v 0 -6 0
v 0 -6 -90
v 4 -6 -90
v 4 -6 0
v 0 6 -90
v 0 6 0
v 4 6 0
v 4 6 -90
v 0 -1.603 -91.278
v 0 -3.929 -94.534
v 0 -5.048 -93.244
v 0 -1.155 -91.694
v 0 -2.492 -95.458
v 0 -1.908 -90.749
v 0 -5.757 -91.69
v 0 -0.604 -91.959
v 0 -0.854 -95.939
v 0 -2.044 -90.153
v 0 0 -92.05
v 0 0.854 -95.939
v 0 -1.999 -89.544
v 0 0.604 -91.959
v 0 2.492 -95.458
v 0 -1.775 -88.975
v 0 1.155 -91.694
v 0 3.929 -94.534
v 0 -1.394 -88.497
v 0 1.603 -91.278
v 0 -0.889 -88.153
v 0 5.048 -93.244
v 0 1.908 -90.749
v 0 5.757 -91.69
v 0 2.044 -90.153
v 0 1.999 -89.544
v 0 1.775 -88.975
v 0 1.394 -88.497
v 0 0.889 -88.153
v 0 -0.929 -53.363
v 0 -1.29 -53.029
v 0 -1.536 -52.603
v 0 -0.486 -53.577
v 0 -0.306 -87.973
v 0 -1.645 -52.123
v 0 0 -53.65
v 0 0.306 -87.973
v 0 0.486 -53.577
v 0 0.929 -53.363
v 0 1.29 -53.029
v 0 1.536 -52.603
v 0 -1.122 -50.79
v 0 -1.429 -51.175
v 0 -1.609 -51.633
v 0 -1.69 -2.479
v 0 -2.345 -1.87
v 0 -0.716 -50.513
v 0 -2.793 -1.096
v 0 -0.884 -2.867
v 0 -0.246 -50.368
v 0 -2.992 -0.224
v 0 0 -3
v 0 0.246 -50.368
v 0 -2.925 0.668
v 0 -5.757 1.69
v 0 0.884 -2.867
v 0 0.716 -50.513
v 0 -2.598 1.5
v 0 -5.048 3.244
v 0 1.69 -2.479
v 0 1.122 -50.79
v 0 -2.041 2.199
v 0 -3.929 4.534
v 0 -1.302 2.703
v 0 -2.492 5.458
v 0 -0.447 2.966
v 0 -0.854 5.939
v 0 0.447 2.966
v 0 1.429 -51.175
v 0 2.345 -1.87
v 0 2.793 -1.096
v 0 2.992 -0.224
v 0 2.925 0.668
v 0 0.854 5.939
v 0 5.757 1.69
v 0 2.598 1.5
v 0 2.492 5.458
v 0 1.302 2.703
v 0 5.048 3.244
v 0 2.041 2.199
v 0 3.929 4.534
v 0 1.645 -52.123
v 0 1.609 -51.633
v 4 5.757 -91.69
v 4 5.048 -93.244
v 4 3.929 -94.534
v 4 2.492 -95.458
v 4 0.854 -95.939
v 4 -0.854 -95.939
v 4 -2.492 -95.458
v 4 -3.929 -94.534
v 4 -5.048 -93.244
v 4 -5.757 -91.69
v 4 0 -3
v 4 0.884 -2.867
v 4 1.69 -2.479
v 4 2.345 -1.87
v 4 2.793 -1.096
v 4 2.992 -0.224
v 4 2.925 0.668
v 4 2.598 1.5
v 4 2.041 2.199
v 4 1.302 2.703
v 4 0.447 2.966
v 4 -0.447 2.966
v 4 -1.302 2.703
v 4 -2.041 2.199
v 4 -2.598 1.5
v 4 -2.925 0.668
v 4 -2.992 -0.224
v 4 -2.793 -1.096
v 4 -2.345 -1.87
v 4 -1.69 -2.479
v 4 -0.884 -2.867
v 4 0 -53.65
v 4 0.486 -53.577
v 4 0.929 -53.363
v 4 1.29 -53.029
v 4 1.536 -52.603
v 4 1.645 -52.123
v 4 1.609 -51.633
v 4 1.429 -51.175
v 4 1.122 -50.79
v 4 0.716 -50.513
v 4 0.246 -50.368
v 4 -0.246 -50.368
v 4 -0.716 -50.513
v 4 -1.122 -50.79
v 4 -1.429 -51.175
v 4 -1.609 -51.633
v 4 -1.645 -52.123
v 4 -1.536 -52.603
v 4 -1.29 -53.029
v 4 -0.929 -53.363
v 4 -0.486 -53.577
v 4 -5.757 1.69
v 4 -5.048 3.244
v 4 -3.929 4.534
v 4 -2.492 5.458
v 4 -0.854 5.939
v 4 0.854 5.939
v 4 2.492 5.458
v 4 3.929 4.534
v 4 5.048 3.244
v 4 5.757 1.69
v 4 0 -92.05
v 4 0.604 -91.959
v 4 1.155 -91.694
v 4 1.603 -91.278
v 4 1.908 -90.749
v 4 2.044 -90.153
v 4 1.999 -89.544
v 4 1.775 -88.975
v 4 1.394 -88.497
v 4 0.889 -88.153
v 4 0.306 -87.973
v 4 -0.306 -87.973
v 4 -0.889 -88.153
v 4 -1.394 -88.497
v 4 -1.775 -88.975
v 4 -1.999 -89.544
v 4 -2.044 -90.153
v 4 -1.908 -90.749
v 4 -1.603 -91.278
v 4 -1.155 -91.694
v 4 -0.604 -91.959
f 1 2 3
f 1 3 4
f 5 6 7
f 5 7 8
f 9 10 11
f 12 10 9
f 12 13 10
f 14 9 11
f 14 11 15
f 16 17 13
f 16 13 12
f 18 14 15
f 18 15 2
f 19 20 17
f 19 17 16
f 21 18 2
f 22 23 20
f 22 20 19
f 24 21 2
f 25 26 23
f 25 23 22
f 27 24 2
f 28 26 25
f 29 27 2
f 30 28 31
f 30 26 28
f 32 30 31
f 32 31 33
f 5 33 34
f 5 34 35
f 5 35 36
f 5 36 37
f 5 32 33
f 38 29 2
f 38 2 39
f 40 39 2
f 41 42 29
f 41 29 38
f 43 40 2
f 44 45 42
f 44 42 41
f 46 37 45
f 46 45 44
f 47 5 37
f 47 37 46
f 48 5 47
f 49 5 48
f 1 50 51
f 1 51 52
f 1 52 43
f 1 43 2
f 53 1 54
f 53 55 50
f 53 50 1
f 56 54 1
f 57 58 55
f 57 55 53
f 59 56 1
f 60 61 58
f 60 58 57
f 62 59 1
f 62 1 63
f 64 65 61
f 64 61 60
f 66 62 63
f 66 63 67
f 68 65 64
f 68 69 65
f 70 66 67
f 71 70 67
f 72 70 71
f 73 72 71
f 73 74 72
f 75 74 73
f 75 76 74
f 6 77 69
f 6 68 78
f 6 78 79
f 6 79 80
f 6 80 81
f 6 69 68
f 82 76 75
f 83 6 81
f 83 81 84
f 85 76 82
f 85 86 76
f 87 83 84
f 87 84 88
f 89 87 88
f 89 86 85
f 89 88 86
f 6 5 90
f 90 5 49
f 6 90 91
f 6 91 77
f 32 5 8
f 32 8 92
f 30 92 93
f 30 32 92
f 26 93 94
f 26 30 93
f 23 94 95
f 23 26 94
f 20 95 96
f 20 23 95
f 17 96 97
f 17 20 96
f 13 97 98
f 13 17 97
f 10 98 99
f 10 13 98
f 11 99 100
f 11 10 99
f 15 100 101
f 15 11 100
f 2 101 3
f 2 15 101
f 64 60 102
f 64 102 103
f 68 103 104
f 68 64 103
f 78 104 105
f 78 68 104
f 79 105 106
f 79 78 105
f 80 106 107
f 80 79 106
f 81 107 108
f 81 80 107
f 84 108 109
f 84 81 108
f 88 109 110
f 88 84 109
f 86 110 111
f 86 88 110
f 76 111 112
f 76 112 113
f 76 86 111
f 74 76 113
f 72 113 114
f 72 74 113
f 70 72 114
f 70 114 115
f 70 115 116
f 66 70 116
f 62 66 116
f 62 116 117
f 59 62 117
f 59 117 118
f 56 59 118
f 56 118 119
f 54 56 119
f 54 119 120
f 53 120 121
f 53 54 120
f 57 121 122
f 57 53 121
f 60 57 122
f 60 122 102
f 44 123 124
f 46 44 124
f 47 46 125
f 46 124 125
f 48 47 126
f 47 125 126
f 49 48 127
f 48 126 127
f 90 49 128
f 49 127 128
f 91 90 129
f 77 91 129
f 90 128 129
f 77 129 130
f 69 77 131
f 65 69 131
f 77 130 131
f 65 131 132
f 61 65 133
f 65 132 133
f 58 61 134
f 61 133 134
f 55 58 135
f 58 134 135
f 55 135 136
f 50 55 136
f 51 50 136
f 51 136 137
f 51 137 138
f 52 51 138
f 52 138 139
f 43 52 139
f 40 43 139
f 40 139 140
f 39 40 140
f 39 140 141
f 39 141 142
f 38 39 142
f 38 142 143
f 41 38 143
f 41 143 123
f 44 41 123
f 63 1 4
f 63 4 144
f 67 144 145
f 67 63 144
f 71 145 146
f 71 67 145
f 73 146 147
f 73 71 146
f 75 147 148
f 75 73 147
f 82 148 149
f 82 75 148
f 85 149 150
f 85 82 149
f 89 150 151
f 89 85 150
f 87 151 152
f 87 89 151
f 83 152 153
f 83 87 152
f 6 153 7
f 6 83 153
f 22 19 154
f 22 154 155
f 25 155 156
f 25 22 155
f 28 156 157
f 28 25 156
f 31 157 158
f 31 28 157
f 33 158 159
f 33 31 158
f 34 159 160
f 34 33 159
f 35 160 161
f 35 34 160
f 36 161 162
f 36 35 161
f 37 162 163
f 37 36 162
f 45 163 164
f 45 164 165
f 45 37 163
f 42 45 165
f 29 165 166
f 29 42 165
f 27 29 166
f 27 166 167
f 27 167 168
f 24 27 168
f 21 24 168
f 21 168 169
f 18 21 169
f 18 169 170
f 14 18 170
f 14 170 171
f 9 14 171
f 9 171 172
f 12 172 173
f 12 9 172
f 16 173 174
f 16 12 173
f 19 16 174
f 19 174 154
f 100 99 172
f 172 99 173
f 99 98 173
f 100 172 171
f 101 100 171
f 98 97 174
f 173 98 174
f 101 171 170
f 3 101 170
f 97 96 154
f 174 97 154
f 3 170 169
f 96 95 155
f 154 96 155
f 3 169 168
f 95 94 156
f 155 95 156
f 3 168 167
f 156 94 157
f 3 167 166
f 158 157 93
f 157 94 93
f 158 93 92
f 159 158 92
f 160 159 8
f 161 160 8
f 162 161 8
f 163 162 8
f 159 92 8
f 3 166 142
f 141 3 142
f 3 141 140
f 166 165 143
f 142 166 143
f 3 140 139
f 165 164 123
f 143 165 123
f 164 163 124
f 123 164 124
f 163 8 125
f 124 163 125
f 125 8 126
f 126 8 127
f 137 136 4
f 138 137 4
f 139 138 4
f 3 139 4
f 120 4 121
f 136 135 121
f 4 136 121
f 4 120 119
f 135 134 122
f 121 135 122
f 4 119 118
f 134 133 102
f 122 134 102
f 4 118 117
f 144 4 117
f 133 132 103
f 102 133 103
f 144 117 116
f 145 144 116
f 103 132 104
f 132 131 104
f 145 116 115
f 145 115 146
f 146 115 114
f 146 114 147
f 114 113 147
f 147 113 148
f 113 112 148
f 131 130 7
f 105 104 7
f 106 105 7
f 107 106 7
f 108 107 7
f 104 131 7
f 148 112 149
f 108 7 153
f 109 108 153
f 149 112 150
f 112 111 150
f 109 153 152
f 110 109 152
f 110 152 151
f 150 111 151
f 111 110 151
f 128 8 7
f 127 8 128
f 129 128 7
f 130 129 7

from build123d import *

# Parameters (mm, degrees)
SKETCH_1_R          = 3
SKETCH_1_R_2        = 2.05
EXTRUDE_1_DEPTH     = 4
SKETCH_2_R          = 1.65
CUT_EXTRUDE_1_DEPTH = 5


with BuildPart() as part:
    # 草图1 → 凸台-拉伸1 (new body)
    with BuildSketch(Plane(origin=(0, 0, 0), x_dir=(0, 0, -1), z_dir=(1, 0, 0))):
        with BuildLine():
            Line((0, 6), (90, 6))
            ThreePointArc((90, 6), (96, 0), (90, -6))
            Line((90, -6), (0, -6))
            ThreePointArc((0, -6), (-6, 0), (0, 6))
        make_face()
        Circle(SKETCH_1_R, mode=Mode.SUBTRACT)
        with Locations((90, 0)):
            Circle(SKETCH_1_R_2, mode=Mode.SUBTRACT)
    extrude(amount=EXTRUDE_1_DEPTH)

    # 草图2 → 切除-拉伸1 (cut, through all)
    with BuildSketch(Plane(origin=(4, 0, 0), x_dir=(0, 0, -1), z_dir=(1, 0, 0))):
        with Locations((52, 0)):
            Circle(SKETCH_2_R)
    extrude(amount=-CUT_EXTRUDE_1_DEPTH, mode=Mode.SUBTRACT)


solid = part.part
